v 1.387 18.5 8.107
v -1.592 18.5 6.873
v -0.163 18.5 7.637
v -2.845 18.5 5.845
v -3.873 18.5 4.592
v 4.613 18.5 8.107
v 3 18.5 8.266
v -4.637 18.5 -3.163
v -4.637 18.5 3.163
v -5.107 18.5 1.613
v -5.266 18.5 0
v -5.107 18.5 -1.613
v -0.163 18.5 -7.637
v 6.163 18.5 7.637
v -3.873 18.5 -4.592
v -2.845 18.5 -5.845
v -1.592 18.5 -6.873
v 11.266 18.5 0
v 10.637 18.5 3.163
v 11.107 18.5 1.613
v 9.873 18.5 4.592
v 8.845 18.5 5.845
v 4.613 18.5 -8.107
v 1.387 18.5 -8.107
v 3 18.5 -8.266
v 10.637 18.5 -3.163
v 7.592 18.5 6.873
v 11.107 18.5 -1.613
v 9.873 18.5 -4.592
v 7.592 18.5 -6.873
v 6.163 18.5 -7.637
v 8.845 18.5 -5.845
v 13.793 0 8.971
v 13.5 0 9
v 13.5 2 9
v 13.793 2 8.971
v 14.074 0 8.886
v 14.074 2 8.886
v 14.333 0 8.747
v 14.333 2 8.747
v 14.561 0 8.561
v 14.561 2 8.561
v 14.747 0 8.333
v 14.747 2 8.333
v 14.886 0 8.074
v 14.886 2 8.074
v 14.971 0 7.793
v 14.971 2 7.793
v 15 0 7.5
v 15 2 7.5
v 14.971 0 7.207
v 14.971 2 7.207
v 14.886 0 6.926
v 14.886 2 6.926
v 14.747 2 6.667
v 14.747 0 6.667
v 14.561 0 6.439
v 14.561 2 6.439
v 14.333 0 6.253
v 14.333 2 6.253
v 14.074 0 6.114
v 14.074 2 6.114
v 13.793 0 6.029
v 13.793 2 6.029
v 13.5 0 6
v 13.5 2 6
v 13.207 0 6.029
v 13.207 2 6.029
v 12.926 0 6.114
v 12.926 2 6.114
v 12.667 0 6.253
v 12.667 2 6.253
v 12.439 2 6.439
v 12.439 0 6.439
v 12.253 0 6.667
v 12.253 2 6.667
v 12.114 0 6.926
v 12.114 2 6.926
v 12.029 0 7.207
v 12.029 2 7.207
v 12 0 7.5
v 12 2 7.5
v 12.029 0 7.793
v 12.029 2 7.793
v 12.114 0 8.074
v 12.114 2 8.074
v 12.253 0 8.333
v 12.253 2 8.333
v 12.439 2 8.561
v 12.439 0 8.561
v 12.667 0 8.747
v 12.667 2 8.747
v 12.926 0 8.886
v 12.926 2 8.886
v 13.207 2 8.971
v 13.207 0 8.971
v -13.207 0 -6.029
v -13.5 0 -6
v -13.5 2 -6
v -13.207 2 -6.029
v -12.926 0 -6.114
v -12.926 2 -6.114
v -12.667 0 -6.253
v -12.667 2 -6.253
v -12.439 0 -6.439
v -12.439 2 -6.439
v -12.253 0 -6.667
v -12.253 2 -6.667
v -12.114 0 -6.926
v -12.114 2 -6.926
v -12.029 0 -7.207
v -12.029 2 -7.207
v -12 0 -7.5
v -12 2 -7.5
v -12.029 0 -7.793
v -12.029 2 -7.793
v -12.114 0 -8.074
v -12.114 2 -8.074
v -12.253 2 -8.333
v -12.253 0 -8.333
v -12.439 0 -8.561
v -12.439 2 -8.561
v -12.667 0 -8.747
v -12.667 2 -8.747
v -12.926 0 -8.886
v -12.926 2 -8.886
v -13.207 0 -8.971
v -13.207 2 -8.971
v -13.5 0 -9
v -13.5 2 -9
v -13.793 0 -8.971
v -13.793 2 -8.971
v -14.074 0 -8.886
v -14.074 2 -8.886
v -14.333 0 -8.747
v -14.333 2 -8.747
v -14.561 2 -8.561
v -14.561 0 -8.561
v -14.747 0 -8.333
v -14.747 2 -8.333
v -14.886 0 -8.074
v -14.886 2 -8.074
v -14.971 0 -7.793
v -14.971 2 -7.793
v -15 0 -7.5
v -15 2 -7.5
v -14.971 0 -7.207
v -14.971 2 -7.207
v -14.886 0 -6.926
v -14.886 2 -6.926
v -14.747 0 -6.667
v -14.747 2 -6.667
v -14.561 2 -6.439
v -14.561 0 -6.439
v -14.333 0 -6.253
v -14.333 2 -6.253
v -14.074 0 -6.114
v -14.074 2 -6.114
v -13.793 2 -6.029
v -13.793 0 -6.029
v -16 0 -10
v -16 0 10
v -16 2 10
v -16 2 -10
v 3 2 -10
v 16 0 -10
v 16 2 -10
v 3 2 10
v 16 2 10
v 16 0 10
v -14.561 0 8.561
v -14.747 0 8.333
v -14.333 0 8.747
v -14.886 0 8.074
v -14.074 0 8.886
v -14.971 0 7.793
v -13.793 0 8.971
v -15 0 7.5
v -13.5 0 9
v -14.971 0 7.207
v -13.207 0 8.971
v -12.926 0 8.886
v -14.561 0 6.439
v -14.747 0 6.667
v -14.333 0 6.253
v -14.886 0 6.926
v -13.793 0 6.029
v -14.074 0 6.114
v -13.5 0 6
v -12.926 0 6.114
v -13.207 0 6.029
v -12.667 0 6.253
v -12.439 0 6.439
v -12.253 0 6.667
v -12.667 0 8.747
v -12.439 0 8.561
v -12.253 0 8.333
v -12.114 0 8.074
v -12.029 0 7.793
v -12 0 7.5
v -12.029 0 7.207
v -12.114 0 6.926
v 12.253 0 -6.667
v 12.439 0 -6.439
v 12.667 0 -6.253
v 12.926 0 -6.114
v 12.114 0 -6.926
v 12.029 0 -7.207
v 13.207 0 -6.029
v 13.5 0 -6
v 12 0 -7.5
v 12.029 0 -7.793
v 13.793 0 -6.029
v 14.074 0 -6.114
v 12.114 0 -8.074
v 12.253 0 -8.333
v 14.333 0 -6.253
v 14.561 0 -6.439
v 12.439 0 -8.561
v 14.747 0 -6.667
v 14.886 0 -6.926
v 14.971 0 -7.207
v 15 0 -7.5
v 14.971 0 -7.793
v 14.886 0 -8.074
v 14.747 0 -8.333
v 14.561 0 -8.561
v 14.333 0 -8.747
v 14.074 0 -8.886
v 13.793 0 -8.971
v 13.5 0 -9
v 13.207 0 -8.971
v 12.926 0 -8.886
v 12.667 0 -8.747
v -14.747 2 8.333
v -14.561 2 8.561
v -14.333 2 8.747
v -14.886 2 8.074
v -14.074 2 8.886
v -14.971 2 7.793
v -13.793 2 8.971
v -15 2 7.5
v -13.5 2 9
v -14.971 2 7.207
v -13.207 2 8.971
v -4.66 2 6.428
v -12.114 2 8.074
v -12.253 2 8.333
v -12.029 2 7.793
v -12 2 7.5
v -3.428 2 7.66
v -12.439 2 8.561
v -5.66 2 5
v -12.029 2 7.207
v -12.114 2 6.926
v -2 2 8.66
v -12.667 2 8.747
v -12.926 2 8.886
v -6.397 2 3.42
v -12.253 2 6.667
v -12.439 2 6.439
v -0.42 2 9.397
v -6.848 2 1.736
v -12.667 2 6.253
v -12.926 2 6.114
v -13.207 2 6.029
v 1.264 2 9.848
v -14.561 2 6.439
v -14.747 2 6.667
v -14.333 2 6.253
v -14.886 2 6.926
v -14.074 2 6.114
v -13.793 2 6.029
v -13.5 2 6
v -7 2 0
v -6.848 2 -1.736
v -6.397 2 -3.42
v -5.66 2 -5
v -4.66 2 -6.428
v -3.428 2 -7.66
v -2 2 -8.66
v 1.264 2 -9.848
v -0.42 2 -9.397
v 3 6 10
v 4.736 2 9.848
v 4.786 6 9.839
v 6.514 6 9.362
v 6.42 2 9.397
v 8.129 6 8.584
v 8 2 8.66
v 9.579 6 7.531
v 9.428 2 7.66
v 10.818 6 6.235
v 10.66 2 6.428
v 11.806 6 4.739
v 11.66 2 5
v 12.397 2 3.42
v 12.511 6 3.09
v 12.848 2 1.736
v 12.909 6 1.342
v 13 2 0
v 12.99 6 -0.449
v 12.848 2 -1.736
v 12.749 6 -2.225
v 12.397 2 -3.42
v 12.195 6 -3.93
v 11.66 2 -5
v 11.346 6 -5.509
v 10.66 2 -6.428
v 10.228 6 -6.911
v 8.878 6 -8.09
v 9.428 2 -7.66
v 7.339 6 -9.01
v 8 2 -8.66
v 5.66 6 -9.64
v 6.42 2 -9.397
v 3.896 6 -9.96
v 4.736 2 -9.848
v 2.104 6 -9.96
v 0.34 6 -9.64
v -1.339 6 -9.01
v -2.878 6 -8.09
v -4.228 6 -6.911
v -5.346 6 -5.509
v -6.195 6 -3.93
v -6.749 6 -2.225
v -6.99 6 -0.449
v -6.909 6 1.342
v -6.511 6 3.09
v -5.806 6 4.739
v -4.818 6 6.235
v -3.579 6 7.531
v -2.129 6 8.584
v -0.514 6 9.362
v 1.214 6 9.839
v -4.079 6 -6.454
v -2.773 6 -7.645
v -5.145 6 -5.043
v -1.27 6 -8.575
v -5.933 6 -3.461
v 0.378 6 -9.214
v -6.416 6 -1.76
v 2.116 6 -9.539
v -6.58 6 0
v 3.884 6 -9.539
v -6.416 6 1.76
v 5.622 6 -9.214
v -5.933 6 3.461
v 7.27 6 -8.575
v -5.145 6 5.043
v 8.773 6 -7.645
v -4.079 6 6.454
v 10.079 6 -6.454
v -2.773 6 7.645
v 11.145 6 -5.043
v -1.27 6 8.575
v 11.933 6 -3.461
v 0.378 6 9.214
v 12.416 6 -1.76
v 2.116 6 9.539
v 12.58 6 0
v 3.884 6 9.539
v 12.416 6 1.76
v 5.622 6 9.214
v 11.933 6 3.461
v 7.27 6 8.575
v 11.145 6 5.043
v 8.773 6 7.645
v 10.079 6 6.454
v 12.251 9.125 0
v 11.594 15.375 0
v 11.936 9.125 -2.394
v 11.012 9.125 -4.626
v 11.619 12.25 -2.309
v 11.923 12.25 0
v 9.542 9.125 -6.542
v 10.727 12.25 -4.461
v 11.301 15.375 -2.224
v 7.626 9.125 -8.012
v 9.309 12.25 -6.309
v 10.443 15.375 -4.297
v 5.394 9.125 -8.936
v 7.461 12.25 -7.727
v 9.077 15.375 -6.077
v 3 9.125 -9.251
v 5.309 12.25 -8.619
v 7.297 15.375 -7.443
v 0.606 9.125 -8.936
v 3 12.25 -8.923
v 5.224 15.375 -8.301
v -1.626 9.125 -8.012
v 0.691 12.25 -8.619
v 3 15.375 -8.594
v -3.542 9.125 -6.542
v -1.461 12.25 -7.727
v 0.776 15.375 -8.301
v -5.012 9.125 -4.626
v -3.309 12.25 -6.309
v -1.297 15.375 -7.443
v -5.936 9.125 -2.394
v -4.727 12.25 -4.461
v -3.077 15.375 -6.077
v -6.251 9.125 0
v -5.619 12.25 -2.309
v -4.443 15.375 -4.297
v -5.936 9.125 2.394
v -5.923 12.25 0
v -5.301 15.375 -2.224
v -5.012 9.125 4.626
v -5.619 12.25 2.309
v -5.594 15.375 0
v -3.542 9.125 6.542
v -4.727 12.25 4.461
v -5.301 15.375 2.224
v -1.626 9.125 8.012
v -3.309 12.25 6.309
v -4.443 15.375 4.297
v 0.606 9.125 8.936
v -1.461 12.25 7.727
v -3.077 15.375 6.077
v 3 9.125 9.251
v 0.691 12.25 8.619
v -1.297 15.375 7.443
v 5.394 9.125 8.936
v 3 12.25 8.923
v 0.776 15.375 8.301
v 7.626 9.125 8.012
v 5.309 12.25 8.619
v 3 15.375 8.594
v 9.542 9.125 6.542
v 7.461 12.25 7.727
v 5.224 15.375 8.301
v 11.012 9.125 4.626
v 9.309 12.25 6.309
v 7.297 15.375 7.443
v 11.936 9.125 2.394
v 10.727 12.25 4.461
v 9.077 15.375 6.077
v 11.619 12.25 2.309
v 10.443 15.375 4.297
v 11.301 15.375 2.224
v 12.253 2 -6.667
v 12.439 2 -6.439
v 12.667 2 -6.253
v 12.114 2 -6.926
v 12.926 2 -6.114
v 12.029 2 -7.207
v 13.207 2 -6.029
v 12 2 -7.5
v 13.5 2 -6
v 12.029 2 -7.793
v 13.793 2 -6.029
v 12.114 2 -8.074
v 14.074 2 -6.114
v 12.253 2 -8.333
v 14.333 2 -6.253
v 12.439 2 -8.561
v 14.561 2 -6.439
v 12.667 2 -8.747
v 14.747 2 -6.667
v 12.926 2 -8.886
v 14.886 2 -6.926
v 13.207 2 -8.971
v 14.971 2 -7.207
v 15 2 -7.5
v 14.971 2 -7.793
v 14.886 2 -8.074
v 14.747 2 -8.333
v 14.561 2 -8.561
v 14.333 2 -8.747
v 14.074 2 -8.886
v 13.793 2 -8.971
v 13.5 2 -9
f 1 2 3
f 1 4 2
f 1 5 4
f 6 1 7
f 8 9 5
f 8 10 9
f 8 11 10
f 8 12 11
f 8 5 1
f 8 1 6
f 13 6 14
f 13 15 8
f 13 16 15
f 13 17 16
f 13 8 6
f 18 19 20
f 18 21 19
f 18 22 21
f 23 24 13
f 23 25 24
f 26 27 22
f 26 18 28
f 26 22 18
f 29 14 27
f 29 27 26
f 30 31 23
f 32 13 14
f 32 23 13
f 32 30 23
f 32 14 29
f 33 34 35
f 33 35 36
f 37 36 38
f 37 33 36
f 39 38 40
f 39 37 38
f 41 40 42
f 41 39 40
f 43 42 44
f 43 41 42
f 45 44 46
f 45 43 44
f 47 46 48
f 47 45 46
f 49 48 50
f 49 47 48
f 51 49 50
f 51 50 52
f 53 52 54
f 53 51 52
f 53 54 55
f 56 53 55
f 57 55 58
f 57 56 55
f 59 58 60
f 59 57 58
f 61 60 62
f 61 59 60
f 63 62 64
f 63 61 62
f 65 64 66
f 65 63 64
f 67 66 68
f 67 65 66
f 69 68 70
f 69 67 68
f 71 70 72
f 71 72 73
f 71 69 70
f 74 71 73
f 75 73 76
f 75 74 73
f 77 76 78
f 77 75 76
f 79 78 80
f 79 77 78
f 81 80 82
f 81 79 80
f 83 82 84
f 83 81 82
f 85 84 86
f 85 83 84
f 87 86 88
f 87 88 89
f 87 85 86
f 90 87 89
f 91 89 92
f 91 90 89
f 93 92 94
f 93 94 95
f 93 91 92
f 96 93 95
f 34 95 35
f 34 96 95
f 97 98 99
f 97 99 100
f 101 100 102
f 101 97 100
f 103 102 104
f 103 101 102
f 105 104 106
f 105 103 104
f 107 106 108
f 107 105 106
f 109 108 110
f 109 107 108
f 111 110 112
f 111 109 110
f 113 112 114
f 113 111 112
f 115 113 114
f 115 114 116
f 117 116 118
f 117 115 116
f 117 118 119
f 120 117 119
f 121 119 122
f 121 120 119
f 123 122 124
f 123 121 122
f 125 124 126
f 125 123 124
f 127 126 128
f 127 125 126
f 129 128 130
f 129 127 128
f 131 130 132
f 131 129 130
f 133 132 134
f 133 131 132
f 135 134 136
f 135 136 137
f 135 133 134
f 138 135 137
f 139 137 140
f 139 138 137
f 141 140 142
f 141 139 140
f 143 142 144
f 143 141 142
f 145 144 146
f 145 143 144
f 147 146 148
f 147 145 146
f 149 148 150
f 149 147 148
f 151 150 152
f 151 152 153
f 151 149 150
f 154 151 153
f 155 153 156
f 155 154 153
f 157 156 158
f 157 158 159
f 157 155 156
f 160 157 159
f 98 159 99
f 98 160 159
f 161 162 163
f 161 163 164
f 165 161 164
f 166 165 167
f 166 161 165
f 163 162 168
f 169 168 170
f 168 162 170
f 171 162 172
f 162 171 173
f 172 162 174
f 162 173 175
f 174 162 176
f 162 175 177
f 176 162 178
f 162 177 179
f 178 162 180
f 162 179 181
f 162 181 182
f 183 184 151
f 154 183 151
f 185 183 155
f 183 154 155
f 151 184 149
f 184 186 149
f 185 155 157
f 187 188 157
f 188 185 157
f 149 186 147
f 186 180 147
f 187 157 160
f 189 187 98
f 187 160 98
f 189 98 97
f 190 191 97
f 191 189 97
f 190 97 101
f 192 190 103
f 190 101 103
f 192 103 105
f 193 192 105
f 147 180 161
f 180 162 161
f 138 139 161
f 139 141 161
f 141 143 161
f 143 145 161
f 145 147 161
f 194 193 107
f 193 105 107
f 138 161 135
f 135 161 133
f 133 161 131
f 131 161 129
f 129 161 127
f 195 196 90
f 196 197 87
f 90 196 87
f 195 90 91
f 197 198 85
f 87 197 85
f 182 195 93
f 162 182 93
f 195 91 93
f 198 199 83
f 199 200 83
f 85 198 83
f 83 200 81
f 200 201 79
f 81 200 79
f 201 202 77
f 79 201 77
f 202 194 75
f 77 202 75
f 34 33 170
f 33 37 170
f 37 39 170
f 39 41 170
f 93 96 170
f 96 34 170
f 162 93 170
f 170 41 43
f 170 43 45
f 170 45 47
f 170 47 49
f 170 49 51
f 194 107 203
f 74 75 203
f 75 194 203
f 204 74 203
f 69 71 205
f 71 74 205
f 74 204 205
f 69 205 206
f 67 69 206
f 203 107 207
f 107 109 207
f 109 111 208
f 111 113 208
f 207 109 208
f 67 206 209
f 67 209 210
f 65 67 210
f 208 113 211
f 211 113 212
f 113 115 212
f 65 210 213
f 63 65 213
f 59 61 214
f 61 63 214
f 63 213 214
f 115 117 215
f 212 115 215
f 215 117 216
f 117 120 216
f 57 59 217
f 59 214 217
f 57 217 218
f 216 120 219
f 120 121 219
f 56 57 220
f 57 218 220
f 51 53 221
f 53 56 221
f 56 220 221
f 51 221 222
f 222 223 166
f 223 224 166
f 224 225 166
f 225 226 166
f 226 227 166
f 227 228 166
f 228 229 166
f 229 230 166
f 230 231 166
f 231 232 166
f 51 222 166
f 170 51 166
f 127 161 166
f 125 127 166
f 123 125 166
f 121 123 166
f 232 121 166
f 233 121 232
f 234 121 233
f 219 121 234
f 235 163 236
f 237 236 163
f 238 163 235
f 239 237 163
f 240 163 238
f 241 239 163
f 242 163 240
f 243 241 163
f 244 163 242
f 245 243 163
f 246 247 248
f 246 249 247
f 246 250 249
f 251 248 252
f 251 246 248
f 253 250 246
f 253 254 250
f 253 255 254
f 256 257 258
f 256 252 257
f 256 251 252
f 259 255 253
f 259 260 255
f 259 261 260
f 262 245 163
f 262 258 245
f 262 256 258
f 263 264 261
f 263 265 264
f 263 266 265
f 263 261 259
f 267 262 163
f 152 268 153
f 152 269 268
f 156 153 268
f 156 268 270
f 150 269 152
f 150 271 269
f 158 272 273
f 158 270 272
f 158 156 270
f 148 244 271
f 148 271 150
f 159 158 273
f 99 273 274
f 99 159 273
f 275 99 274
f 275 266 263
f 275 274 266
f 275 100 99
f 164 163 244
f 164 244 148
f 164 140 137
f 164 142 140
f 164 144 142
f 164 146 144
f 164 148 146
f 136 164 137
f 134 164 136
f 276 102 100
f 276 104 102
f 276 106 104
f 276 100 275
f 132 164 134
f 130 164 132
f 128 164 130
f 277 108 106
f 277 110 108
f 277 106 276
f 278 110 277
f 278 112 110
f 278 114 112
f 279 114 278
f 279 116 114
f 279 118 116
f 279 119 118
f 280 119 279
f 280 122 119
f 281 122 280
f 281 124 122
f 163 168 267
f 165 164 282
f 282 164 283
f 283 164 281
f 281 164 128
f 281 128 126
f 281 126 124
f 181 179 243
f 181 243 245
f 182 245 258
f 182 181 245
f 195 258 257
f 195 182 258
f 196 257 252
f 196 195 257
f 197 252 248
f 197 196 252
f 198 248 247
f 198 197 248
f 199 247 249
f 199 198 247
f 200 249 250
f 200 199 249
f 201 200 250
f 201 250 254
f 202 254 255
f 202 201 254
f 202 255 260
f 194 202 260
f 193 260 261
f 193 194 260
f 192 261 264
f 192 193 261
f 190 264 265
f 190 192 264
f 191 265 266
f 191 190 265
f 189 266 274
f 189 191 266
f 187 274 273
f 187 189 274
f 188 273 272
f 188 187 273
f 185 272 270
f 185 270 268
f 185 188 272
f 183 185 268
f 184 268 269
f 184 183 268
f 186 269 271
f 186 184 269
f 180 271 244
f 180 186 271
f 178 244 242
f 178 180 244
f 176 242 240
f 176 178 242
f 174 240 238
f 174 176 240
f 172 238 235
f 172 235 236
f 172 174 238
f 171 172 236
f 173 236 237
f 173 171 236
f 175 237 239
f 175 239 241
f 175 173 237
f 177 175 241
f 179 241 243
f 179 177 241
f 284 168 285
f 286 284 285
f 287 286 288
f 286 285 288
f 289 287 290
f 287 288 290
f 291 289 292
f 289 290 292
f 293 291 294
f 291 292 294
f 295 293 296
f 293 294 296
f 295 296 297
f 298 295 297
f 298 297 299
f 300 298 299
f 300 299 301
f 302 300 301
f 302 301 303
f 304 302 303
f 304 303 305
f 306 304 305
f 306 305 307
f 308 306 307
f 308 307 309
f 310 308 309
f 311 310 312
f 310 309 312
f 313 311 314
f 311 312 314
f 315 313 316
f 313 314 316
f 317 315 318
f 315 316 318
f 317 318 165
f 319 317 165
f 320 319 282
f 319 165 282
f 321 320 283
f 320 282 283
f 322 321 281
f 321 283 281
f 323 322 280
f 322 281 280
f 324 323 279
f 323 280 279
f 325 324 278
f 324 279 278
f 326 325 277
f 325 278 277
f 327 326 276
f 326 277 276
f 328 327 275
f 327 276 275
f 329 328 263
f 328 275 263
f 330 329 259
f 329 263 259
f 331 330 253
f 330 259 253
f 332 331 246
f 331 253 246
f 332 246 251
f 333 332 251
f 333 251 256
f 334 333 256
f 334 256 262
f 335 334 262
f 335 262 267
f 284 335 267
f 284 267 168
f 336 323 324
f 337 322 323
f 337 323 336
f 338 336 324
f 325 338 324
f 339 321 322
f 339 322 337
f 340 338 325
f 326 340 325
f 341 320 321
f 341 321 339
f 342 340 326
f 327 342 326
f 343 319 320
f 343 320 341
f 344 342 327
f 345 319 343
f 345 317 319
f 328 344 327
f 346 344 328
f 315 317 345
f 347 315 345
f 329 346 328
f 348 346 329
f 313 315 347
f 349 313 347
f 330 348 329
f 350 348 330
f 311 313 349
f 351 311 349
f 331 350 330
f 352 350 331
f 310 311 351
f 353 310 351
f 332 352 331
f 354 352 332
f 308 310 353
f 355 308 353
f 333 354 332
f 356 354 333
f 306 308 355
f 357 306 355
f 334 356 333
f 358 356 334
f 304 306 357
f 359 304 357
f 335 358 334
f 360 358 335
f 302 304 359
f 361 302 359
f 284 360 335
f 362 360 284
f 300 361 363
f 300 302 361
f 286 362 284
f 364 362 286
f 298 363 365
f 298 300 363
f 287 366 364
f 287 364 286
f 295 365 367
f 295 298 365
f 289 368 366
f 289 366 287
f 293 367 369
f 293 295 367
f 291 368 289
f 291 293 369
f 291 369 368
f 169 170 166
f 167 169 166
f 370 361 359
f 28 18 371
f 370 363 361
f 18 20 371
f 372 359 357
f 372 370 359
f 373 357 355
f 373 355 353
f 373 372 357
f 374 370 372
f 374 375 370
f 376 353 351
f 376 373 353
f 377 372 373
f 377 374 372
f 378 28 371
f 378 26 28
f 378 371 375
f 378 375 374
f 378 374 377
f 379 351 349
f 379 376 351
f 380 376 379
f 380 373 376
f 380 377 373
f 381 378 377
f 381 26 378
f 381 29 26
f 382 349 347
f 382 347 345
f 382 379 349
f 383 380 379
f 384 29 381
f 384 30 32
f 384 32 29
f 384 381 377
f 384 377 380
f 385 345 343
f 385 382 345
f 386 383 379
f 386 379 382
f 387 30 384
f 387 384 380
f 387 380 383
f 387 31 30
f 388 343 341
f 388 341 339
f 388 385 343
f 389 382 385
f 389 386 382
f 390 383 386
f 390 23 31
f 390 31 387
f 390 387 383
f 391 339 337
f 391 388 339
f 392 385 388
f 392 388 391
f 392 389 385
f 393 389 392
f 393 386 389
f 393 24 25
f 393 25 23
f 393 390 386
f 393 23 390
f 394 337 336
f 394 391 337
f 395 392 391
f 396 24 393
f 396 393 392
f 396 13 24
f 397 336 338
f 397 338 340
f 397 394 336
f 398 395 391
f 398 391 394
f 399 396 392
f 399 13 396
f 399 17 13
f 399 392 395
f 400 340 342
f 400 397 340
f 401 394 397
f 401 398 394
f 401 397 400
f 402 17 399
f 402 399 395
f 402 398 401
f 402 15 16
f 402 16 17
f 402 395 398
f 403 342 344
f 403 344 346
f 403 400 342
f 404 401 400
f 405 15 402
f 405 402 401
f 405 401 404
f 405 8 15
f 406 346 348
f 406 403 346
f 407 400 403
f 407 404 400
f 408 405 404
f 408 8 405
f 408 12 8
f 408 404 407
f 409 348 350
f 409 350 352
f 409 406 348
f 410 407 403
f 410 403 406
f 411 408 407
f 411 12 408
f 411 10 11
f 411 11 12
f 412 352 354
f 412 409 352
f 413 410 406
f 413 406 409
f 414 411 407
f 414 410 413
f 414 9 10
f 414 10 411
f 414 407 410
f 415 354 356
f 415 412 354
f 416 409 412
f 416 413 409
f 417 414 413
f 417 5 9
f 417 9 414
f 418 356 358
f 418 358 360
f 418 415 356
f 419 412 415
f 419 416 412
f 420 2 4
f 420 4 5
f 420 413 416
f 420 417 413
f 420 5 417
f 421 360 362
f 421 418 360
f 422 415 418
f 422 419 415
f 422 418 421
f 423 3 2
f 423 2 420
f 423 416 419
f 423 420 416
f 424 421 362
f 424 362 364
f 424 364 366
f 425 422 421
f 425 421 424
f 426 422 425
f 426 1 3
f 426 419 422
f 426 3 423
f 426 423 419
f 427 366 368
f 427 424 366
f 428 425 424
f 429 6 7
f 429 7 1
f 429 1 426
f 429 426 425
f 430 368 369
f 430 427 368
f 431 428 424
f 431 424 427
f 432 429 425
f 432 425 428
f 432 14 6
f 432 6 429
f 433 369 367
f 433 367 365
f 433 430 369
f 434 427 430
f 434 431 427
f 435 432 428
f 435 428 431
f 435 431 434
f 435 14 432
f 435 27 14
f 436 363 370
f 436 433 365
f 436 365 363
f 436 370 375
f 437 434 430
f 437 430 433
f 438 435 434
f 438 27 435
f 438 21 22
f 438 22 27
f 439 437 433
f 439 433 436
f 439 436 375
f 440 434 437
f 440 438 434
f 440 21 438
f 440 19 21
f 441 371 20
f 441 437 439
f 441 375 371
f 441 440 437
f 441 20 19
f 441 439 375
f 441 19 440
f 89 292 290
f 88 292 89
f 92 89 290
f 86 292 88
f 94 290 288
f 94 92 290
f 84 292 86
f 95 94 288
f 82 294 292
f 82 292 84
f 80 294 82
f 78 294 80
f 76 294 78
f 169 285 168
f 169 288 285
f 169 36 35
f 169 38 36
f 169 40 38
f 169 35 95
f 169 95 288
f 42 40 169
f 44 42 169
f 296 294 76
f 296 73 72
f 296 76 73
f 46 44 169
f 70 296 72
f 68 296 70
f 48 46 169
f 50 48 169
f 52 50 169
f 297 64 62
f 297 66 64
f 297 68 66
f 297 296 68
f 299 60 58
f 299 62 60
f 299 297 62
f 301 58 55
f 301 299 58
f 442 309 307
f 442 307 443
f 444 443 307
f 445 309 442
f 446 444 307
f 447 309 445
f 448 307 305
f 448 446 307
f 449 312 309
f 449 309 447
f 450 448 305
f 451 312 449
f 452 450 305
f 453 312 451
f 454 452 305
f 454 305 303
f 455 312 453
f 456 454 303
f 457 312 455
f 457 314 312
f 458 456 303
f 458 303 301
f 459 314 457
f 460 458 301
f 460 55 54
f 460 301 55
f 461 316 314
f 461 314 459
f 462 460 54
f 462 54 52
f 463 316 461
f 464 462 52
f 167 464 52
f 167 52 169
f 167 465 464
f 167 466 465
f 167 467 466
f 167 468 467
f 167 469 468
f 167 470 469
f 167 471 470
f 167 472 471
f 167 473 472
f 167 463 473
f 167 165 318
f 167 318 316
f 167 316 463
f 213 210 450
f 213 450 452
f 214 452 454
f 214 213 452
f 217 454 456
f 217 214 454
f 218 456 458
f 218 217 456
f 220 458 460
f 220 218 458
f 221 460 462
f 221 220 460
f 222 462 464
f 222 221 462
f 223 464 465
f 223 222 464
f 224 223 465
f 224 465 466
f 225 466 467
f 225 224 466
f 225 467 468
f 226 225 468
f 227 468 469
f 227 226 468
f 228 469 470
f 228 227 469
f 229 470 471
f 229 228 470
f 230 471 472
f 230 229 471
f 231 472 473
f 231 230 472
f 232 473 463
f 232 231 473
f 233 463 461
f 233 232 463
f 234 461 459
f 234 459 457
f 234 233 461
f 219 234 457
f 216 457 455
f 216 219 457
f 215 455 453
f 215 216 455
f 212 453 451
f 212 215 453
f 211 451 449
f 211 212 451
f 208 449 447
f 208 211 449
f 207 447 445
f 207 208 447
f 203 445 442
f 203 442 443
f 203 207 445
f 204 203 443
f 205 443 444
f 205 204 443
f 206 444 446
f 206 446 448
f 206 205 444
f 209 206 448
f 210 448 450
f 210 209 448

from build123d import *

# Parameters (mm, degrees)
CROQUIS1_W              = 32
CROQUIS1_H              = 20
CROQUIS1_R              = 1.5
SALIENTE_EXTRUIR1_DEPTH = 2
CROQUIS2_R              = 10
SALIENTE_EXTRUIR2_DEPTH = 16.5
SALIENTE_EXTRUIR2_TAPER = 6
CROQUIS4_R              = 10
SALIENTE_EXTRUIR3_DEPTH = 4


with BuildPart() as part:
    # Croquis1 → Saliente-Extruir1 (new body)
    with BuildSketch(Plane(origin=(0, 0, 0), x_dir=(1, 0, 0), z_dir=(0, 1, 0))):
        Rectangle(CROQUIS1_W, CROQUIS1_H)
        with Locations(Location((-13.5, 7.5, 0), (0, 0, 270))):
            Circle(CROQUIS1_R, mode=Mode.SUBTRACT)
        with Locations(Location((13.5, 7.5, 0), (0, 0, 270))):
            Circle(CROQUIS1_R, mode=Mode.SUBTRACT)
        with Locations(Location((-13.5, -7.5, 0), (0, 0, 270))):
            Circle(CROQUIS1_R, mode=Mode.SUBTRACT)
        with Locations(Location((13.5, -7.5, 0), (0, 0, 270))):
            Circle(CROQUIS1_R, mode=Mode.SUBTRACT)
    extrude(amount=SALIENTE_EXTRUIR1_DEPTH)

    # Croquis2 → Saliente-Extruir2 (add)
    with BuildSketch(Plane(origin=(0, 2, 0), x_dir=(1, 0, 0), z_dir=(0, 1, 0))):
        with Locations((3, 0)):
            Circle(CROQUIS2_R)
    extrude(amount=SALIENTE_EXTRUIR2_DEPTH, taper=SALIENTE_EXTRUIR2_TAPER)

    # Croquis4 → Saliente-Extruir3 (add)
    with BuildSketch(Plane(origin=(0, 2, 0), x_dir=(1, 0, 0), z_dir=(0, 1, 0))):
        with Locations(Location((3, 0, 0), (0, 0, 270))):
            Circle(CROQUIS4_R)
    extrude(amount=SALIENTE_EXTRUIR3_DEPTH)


solid = part.part
